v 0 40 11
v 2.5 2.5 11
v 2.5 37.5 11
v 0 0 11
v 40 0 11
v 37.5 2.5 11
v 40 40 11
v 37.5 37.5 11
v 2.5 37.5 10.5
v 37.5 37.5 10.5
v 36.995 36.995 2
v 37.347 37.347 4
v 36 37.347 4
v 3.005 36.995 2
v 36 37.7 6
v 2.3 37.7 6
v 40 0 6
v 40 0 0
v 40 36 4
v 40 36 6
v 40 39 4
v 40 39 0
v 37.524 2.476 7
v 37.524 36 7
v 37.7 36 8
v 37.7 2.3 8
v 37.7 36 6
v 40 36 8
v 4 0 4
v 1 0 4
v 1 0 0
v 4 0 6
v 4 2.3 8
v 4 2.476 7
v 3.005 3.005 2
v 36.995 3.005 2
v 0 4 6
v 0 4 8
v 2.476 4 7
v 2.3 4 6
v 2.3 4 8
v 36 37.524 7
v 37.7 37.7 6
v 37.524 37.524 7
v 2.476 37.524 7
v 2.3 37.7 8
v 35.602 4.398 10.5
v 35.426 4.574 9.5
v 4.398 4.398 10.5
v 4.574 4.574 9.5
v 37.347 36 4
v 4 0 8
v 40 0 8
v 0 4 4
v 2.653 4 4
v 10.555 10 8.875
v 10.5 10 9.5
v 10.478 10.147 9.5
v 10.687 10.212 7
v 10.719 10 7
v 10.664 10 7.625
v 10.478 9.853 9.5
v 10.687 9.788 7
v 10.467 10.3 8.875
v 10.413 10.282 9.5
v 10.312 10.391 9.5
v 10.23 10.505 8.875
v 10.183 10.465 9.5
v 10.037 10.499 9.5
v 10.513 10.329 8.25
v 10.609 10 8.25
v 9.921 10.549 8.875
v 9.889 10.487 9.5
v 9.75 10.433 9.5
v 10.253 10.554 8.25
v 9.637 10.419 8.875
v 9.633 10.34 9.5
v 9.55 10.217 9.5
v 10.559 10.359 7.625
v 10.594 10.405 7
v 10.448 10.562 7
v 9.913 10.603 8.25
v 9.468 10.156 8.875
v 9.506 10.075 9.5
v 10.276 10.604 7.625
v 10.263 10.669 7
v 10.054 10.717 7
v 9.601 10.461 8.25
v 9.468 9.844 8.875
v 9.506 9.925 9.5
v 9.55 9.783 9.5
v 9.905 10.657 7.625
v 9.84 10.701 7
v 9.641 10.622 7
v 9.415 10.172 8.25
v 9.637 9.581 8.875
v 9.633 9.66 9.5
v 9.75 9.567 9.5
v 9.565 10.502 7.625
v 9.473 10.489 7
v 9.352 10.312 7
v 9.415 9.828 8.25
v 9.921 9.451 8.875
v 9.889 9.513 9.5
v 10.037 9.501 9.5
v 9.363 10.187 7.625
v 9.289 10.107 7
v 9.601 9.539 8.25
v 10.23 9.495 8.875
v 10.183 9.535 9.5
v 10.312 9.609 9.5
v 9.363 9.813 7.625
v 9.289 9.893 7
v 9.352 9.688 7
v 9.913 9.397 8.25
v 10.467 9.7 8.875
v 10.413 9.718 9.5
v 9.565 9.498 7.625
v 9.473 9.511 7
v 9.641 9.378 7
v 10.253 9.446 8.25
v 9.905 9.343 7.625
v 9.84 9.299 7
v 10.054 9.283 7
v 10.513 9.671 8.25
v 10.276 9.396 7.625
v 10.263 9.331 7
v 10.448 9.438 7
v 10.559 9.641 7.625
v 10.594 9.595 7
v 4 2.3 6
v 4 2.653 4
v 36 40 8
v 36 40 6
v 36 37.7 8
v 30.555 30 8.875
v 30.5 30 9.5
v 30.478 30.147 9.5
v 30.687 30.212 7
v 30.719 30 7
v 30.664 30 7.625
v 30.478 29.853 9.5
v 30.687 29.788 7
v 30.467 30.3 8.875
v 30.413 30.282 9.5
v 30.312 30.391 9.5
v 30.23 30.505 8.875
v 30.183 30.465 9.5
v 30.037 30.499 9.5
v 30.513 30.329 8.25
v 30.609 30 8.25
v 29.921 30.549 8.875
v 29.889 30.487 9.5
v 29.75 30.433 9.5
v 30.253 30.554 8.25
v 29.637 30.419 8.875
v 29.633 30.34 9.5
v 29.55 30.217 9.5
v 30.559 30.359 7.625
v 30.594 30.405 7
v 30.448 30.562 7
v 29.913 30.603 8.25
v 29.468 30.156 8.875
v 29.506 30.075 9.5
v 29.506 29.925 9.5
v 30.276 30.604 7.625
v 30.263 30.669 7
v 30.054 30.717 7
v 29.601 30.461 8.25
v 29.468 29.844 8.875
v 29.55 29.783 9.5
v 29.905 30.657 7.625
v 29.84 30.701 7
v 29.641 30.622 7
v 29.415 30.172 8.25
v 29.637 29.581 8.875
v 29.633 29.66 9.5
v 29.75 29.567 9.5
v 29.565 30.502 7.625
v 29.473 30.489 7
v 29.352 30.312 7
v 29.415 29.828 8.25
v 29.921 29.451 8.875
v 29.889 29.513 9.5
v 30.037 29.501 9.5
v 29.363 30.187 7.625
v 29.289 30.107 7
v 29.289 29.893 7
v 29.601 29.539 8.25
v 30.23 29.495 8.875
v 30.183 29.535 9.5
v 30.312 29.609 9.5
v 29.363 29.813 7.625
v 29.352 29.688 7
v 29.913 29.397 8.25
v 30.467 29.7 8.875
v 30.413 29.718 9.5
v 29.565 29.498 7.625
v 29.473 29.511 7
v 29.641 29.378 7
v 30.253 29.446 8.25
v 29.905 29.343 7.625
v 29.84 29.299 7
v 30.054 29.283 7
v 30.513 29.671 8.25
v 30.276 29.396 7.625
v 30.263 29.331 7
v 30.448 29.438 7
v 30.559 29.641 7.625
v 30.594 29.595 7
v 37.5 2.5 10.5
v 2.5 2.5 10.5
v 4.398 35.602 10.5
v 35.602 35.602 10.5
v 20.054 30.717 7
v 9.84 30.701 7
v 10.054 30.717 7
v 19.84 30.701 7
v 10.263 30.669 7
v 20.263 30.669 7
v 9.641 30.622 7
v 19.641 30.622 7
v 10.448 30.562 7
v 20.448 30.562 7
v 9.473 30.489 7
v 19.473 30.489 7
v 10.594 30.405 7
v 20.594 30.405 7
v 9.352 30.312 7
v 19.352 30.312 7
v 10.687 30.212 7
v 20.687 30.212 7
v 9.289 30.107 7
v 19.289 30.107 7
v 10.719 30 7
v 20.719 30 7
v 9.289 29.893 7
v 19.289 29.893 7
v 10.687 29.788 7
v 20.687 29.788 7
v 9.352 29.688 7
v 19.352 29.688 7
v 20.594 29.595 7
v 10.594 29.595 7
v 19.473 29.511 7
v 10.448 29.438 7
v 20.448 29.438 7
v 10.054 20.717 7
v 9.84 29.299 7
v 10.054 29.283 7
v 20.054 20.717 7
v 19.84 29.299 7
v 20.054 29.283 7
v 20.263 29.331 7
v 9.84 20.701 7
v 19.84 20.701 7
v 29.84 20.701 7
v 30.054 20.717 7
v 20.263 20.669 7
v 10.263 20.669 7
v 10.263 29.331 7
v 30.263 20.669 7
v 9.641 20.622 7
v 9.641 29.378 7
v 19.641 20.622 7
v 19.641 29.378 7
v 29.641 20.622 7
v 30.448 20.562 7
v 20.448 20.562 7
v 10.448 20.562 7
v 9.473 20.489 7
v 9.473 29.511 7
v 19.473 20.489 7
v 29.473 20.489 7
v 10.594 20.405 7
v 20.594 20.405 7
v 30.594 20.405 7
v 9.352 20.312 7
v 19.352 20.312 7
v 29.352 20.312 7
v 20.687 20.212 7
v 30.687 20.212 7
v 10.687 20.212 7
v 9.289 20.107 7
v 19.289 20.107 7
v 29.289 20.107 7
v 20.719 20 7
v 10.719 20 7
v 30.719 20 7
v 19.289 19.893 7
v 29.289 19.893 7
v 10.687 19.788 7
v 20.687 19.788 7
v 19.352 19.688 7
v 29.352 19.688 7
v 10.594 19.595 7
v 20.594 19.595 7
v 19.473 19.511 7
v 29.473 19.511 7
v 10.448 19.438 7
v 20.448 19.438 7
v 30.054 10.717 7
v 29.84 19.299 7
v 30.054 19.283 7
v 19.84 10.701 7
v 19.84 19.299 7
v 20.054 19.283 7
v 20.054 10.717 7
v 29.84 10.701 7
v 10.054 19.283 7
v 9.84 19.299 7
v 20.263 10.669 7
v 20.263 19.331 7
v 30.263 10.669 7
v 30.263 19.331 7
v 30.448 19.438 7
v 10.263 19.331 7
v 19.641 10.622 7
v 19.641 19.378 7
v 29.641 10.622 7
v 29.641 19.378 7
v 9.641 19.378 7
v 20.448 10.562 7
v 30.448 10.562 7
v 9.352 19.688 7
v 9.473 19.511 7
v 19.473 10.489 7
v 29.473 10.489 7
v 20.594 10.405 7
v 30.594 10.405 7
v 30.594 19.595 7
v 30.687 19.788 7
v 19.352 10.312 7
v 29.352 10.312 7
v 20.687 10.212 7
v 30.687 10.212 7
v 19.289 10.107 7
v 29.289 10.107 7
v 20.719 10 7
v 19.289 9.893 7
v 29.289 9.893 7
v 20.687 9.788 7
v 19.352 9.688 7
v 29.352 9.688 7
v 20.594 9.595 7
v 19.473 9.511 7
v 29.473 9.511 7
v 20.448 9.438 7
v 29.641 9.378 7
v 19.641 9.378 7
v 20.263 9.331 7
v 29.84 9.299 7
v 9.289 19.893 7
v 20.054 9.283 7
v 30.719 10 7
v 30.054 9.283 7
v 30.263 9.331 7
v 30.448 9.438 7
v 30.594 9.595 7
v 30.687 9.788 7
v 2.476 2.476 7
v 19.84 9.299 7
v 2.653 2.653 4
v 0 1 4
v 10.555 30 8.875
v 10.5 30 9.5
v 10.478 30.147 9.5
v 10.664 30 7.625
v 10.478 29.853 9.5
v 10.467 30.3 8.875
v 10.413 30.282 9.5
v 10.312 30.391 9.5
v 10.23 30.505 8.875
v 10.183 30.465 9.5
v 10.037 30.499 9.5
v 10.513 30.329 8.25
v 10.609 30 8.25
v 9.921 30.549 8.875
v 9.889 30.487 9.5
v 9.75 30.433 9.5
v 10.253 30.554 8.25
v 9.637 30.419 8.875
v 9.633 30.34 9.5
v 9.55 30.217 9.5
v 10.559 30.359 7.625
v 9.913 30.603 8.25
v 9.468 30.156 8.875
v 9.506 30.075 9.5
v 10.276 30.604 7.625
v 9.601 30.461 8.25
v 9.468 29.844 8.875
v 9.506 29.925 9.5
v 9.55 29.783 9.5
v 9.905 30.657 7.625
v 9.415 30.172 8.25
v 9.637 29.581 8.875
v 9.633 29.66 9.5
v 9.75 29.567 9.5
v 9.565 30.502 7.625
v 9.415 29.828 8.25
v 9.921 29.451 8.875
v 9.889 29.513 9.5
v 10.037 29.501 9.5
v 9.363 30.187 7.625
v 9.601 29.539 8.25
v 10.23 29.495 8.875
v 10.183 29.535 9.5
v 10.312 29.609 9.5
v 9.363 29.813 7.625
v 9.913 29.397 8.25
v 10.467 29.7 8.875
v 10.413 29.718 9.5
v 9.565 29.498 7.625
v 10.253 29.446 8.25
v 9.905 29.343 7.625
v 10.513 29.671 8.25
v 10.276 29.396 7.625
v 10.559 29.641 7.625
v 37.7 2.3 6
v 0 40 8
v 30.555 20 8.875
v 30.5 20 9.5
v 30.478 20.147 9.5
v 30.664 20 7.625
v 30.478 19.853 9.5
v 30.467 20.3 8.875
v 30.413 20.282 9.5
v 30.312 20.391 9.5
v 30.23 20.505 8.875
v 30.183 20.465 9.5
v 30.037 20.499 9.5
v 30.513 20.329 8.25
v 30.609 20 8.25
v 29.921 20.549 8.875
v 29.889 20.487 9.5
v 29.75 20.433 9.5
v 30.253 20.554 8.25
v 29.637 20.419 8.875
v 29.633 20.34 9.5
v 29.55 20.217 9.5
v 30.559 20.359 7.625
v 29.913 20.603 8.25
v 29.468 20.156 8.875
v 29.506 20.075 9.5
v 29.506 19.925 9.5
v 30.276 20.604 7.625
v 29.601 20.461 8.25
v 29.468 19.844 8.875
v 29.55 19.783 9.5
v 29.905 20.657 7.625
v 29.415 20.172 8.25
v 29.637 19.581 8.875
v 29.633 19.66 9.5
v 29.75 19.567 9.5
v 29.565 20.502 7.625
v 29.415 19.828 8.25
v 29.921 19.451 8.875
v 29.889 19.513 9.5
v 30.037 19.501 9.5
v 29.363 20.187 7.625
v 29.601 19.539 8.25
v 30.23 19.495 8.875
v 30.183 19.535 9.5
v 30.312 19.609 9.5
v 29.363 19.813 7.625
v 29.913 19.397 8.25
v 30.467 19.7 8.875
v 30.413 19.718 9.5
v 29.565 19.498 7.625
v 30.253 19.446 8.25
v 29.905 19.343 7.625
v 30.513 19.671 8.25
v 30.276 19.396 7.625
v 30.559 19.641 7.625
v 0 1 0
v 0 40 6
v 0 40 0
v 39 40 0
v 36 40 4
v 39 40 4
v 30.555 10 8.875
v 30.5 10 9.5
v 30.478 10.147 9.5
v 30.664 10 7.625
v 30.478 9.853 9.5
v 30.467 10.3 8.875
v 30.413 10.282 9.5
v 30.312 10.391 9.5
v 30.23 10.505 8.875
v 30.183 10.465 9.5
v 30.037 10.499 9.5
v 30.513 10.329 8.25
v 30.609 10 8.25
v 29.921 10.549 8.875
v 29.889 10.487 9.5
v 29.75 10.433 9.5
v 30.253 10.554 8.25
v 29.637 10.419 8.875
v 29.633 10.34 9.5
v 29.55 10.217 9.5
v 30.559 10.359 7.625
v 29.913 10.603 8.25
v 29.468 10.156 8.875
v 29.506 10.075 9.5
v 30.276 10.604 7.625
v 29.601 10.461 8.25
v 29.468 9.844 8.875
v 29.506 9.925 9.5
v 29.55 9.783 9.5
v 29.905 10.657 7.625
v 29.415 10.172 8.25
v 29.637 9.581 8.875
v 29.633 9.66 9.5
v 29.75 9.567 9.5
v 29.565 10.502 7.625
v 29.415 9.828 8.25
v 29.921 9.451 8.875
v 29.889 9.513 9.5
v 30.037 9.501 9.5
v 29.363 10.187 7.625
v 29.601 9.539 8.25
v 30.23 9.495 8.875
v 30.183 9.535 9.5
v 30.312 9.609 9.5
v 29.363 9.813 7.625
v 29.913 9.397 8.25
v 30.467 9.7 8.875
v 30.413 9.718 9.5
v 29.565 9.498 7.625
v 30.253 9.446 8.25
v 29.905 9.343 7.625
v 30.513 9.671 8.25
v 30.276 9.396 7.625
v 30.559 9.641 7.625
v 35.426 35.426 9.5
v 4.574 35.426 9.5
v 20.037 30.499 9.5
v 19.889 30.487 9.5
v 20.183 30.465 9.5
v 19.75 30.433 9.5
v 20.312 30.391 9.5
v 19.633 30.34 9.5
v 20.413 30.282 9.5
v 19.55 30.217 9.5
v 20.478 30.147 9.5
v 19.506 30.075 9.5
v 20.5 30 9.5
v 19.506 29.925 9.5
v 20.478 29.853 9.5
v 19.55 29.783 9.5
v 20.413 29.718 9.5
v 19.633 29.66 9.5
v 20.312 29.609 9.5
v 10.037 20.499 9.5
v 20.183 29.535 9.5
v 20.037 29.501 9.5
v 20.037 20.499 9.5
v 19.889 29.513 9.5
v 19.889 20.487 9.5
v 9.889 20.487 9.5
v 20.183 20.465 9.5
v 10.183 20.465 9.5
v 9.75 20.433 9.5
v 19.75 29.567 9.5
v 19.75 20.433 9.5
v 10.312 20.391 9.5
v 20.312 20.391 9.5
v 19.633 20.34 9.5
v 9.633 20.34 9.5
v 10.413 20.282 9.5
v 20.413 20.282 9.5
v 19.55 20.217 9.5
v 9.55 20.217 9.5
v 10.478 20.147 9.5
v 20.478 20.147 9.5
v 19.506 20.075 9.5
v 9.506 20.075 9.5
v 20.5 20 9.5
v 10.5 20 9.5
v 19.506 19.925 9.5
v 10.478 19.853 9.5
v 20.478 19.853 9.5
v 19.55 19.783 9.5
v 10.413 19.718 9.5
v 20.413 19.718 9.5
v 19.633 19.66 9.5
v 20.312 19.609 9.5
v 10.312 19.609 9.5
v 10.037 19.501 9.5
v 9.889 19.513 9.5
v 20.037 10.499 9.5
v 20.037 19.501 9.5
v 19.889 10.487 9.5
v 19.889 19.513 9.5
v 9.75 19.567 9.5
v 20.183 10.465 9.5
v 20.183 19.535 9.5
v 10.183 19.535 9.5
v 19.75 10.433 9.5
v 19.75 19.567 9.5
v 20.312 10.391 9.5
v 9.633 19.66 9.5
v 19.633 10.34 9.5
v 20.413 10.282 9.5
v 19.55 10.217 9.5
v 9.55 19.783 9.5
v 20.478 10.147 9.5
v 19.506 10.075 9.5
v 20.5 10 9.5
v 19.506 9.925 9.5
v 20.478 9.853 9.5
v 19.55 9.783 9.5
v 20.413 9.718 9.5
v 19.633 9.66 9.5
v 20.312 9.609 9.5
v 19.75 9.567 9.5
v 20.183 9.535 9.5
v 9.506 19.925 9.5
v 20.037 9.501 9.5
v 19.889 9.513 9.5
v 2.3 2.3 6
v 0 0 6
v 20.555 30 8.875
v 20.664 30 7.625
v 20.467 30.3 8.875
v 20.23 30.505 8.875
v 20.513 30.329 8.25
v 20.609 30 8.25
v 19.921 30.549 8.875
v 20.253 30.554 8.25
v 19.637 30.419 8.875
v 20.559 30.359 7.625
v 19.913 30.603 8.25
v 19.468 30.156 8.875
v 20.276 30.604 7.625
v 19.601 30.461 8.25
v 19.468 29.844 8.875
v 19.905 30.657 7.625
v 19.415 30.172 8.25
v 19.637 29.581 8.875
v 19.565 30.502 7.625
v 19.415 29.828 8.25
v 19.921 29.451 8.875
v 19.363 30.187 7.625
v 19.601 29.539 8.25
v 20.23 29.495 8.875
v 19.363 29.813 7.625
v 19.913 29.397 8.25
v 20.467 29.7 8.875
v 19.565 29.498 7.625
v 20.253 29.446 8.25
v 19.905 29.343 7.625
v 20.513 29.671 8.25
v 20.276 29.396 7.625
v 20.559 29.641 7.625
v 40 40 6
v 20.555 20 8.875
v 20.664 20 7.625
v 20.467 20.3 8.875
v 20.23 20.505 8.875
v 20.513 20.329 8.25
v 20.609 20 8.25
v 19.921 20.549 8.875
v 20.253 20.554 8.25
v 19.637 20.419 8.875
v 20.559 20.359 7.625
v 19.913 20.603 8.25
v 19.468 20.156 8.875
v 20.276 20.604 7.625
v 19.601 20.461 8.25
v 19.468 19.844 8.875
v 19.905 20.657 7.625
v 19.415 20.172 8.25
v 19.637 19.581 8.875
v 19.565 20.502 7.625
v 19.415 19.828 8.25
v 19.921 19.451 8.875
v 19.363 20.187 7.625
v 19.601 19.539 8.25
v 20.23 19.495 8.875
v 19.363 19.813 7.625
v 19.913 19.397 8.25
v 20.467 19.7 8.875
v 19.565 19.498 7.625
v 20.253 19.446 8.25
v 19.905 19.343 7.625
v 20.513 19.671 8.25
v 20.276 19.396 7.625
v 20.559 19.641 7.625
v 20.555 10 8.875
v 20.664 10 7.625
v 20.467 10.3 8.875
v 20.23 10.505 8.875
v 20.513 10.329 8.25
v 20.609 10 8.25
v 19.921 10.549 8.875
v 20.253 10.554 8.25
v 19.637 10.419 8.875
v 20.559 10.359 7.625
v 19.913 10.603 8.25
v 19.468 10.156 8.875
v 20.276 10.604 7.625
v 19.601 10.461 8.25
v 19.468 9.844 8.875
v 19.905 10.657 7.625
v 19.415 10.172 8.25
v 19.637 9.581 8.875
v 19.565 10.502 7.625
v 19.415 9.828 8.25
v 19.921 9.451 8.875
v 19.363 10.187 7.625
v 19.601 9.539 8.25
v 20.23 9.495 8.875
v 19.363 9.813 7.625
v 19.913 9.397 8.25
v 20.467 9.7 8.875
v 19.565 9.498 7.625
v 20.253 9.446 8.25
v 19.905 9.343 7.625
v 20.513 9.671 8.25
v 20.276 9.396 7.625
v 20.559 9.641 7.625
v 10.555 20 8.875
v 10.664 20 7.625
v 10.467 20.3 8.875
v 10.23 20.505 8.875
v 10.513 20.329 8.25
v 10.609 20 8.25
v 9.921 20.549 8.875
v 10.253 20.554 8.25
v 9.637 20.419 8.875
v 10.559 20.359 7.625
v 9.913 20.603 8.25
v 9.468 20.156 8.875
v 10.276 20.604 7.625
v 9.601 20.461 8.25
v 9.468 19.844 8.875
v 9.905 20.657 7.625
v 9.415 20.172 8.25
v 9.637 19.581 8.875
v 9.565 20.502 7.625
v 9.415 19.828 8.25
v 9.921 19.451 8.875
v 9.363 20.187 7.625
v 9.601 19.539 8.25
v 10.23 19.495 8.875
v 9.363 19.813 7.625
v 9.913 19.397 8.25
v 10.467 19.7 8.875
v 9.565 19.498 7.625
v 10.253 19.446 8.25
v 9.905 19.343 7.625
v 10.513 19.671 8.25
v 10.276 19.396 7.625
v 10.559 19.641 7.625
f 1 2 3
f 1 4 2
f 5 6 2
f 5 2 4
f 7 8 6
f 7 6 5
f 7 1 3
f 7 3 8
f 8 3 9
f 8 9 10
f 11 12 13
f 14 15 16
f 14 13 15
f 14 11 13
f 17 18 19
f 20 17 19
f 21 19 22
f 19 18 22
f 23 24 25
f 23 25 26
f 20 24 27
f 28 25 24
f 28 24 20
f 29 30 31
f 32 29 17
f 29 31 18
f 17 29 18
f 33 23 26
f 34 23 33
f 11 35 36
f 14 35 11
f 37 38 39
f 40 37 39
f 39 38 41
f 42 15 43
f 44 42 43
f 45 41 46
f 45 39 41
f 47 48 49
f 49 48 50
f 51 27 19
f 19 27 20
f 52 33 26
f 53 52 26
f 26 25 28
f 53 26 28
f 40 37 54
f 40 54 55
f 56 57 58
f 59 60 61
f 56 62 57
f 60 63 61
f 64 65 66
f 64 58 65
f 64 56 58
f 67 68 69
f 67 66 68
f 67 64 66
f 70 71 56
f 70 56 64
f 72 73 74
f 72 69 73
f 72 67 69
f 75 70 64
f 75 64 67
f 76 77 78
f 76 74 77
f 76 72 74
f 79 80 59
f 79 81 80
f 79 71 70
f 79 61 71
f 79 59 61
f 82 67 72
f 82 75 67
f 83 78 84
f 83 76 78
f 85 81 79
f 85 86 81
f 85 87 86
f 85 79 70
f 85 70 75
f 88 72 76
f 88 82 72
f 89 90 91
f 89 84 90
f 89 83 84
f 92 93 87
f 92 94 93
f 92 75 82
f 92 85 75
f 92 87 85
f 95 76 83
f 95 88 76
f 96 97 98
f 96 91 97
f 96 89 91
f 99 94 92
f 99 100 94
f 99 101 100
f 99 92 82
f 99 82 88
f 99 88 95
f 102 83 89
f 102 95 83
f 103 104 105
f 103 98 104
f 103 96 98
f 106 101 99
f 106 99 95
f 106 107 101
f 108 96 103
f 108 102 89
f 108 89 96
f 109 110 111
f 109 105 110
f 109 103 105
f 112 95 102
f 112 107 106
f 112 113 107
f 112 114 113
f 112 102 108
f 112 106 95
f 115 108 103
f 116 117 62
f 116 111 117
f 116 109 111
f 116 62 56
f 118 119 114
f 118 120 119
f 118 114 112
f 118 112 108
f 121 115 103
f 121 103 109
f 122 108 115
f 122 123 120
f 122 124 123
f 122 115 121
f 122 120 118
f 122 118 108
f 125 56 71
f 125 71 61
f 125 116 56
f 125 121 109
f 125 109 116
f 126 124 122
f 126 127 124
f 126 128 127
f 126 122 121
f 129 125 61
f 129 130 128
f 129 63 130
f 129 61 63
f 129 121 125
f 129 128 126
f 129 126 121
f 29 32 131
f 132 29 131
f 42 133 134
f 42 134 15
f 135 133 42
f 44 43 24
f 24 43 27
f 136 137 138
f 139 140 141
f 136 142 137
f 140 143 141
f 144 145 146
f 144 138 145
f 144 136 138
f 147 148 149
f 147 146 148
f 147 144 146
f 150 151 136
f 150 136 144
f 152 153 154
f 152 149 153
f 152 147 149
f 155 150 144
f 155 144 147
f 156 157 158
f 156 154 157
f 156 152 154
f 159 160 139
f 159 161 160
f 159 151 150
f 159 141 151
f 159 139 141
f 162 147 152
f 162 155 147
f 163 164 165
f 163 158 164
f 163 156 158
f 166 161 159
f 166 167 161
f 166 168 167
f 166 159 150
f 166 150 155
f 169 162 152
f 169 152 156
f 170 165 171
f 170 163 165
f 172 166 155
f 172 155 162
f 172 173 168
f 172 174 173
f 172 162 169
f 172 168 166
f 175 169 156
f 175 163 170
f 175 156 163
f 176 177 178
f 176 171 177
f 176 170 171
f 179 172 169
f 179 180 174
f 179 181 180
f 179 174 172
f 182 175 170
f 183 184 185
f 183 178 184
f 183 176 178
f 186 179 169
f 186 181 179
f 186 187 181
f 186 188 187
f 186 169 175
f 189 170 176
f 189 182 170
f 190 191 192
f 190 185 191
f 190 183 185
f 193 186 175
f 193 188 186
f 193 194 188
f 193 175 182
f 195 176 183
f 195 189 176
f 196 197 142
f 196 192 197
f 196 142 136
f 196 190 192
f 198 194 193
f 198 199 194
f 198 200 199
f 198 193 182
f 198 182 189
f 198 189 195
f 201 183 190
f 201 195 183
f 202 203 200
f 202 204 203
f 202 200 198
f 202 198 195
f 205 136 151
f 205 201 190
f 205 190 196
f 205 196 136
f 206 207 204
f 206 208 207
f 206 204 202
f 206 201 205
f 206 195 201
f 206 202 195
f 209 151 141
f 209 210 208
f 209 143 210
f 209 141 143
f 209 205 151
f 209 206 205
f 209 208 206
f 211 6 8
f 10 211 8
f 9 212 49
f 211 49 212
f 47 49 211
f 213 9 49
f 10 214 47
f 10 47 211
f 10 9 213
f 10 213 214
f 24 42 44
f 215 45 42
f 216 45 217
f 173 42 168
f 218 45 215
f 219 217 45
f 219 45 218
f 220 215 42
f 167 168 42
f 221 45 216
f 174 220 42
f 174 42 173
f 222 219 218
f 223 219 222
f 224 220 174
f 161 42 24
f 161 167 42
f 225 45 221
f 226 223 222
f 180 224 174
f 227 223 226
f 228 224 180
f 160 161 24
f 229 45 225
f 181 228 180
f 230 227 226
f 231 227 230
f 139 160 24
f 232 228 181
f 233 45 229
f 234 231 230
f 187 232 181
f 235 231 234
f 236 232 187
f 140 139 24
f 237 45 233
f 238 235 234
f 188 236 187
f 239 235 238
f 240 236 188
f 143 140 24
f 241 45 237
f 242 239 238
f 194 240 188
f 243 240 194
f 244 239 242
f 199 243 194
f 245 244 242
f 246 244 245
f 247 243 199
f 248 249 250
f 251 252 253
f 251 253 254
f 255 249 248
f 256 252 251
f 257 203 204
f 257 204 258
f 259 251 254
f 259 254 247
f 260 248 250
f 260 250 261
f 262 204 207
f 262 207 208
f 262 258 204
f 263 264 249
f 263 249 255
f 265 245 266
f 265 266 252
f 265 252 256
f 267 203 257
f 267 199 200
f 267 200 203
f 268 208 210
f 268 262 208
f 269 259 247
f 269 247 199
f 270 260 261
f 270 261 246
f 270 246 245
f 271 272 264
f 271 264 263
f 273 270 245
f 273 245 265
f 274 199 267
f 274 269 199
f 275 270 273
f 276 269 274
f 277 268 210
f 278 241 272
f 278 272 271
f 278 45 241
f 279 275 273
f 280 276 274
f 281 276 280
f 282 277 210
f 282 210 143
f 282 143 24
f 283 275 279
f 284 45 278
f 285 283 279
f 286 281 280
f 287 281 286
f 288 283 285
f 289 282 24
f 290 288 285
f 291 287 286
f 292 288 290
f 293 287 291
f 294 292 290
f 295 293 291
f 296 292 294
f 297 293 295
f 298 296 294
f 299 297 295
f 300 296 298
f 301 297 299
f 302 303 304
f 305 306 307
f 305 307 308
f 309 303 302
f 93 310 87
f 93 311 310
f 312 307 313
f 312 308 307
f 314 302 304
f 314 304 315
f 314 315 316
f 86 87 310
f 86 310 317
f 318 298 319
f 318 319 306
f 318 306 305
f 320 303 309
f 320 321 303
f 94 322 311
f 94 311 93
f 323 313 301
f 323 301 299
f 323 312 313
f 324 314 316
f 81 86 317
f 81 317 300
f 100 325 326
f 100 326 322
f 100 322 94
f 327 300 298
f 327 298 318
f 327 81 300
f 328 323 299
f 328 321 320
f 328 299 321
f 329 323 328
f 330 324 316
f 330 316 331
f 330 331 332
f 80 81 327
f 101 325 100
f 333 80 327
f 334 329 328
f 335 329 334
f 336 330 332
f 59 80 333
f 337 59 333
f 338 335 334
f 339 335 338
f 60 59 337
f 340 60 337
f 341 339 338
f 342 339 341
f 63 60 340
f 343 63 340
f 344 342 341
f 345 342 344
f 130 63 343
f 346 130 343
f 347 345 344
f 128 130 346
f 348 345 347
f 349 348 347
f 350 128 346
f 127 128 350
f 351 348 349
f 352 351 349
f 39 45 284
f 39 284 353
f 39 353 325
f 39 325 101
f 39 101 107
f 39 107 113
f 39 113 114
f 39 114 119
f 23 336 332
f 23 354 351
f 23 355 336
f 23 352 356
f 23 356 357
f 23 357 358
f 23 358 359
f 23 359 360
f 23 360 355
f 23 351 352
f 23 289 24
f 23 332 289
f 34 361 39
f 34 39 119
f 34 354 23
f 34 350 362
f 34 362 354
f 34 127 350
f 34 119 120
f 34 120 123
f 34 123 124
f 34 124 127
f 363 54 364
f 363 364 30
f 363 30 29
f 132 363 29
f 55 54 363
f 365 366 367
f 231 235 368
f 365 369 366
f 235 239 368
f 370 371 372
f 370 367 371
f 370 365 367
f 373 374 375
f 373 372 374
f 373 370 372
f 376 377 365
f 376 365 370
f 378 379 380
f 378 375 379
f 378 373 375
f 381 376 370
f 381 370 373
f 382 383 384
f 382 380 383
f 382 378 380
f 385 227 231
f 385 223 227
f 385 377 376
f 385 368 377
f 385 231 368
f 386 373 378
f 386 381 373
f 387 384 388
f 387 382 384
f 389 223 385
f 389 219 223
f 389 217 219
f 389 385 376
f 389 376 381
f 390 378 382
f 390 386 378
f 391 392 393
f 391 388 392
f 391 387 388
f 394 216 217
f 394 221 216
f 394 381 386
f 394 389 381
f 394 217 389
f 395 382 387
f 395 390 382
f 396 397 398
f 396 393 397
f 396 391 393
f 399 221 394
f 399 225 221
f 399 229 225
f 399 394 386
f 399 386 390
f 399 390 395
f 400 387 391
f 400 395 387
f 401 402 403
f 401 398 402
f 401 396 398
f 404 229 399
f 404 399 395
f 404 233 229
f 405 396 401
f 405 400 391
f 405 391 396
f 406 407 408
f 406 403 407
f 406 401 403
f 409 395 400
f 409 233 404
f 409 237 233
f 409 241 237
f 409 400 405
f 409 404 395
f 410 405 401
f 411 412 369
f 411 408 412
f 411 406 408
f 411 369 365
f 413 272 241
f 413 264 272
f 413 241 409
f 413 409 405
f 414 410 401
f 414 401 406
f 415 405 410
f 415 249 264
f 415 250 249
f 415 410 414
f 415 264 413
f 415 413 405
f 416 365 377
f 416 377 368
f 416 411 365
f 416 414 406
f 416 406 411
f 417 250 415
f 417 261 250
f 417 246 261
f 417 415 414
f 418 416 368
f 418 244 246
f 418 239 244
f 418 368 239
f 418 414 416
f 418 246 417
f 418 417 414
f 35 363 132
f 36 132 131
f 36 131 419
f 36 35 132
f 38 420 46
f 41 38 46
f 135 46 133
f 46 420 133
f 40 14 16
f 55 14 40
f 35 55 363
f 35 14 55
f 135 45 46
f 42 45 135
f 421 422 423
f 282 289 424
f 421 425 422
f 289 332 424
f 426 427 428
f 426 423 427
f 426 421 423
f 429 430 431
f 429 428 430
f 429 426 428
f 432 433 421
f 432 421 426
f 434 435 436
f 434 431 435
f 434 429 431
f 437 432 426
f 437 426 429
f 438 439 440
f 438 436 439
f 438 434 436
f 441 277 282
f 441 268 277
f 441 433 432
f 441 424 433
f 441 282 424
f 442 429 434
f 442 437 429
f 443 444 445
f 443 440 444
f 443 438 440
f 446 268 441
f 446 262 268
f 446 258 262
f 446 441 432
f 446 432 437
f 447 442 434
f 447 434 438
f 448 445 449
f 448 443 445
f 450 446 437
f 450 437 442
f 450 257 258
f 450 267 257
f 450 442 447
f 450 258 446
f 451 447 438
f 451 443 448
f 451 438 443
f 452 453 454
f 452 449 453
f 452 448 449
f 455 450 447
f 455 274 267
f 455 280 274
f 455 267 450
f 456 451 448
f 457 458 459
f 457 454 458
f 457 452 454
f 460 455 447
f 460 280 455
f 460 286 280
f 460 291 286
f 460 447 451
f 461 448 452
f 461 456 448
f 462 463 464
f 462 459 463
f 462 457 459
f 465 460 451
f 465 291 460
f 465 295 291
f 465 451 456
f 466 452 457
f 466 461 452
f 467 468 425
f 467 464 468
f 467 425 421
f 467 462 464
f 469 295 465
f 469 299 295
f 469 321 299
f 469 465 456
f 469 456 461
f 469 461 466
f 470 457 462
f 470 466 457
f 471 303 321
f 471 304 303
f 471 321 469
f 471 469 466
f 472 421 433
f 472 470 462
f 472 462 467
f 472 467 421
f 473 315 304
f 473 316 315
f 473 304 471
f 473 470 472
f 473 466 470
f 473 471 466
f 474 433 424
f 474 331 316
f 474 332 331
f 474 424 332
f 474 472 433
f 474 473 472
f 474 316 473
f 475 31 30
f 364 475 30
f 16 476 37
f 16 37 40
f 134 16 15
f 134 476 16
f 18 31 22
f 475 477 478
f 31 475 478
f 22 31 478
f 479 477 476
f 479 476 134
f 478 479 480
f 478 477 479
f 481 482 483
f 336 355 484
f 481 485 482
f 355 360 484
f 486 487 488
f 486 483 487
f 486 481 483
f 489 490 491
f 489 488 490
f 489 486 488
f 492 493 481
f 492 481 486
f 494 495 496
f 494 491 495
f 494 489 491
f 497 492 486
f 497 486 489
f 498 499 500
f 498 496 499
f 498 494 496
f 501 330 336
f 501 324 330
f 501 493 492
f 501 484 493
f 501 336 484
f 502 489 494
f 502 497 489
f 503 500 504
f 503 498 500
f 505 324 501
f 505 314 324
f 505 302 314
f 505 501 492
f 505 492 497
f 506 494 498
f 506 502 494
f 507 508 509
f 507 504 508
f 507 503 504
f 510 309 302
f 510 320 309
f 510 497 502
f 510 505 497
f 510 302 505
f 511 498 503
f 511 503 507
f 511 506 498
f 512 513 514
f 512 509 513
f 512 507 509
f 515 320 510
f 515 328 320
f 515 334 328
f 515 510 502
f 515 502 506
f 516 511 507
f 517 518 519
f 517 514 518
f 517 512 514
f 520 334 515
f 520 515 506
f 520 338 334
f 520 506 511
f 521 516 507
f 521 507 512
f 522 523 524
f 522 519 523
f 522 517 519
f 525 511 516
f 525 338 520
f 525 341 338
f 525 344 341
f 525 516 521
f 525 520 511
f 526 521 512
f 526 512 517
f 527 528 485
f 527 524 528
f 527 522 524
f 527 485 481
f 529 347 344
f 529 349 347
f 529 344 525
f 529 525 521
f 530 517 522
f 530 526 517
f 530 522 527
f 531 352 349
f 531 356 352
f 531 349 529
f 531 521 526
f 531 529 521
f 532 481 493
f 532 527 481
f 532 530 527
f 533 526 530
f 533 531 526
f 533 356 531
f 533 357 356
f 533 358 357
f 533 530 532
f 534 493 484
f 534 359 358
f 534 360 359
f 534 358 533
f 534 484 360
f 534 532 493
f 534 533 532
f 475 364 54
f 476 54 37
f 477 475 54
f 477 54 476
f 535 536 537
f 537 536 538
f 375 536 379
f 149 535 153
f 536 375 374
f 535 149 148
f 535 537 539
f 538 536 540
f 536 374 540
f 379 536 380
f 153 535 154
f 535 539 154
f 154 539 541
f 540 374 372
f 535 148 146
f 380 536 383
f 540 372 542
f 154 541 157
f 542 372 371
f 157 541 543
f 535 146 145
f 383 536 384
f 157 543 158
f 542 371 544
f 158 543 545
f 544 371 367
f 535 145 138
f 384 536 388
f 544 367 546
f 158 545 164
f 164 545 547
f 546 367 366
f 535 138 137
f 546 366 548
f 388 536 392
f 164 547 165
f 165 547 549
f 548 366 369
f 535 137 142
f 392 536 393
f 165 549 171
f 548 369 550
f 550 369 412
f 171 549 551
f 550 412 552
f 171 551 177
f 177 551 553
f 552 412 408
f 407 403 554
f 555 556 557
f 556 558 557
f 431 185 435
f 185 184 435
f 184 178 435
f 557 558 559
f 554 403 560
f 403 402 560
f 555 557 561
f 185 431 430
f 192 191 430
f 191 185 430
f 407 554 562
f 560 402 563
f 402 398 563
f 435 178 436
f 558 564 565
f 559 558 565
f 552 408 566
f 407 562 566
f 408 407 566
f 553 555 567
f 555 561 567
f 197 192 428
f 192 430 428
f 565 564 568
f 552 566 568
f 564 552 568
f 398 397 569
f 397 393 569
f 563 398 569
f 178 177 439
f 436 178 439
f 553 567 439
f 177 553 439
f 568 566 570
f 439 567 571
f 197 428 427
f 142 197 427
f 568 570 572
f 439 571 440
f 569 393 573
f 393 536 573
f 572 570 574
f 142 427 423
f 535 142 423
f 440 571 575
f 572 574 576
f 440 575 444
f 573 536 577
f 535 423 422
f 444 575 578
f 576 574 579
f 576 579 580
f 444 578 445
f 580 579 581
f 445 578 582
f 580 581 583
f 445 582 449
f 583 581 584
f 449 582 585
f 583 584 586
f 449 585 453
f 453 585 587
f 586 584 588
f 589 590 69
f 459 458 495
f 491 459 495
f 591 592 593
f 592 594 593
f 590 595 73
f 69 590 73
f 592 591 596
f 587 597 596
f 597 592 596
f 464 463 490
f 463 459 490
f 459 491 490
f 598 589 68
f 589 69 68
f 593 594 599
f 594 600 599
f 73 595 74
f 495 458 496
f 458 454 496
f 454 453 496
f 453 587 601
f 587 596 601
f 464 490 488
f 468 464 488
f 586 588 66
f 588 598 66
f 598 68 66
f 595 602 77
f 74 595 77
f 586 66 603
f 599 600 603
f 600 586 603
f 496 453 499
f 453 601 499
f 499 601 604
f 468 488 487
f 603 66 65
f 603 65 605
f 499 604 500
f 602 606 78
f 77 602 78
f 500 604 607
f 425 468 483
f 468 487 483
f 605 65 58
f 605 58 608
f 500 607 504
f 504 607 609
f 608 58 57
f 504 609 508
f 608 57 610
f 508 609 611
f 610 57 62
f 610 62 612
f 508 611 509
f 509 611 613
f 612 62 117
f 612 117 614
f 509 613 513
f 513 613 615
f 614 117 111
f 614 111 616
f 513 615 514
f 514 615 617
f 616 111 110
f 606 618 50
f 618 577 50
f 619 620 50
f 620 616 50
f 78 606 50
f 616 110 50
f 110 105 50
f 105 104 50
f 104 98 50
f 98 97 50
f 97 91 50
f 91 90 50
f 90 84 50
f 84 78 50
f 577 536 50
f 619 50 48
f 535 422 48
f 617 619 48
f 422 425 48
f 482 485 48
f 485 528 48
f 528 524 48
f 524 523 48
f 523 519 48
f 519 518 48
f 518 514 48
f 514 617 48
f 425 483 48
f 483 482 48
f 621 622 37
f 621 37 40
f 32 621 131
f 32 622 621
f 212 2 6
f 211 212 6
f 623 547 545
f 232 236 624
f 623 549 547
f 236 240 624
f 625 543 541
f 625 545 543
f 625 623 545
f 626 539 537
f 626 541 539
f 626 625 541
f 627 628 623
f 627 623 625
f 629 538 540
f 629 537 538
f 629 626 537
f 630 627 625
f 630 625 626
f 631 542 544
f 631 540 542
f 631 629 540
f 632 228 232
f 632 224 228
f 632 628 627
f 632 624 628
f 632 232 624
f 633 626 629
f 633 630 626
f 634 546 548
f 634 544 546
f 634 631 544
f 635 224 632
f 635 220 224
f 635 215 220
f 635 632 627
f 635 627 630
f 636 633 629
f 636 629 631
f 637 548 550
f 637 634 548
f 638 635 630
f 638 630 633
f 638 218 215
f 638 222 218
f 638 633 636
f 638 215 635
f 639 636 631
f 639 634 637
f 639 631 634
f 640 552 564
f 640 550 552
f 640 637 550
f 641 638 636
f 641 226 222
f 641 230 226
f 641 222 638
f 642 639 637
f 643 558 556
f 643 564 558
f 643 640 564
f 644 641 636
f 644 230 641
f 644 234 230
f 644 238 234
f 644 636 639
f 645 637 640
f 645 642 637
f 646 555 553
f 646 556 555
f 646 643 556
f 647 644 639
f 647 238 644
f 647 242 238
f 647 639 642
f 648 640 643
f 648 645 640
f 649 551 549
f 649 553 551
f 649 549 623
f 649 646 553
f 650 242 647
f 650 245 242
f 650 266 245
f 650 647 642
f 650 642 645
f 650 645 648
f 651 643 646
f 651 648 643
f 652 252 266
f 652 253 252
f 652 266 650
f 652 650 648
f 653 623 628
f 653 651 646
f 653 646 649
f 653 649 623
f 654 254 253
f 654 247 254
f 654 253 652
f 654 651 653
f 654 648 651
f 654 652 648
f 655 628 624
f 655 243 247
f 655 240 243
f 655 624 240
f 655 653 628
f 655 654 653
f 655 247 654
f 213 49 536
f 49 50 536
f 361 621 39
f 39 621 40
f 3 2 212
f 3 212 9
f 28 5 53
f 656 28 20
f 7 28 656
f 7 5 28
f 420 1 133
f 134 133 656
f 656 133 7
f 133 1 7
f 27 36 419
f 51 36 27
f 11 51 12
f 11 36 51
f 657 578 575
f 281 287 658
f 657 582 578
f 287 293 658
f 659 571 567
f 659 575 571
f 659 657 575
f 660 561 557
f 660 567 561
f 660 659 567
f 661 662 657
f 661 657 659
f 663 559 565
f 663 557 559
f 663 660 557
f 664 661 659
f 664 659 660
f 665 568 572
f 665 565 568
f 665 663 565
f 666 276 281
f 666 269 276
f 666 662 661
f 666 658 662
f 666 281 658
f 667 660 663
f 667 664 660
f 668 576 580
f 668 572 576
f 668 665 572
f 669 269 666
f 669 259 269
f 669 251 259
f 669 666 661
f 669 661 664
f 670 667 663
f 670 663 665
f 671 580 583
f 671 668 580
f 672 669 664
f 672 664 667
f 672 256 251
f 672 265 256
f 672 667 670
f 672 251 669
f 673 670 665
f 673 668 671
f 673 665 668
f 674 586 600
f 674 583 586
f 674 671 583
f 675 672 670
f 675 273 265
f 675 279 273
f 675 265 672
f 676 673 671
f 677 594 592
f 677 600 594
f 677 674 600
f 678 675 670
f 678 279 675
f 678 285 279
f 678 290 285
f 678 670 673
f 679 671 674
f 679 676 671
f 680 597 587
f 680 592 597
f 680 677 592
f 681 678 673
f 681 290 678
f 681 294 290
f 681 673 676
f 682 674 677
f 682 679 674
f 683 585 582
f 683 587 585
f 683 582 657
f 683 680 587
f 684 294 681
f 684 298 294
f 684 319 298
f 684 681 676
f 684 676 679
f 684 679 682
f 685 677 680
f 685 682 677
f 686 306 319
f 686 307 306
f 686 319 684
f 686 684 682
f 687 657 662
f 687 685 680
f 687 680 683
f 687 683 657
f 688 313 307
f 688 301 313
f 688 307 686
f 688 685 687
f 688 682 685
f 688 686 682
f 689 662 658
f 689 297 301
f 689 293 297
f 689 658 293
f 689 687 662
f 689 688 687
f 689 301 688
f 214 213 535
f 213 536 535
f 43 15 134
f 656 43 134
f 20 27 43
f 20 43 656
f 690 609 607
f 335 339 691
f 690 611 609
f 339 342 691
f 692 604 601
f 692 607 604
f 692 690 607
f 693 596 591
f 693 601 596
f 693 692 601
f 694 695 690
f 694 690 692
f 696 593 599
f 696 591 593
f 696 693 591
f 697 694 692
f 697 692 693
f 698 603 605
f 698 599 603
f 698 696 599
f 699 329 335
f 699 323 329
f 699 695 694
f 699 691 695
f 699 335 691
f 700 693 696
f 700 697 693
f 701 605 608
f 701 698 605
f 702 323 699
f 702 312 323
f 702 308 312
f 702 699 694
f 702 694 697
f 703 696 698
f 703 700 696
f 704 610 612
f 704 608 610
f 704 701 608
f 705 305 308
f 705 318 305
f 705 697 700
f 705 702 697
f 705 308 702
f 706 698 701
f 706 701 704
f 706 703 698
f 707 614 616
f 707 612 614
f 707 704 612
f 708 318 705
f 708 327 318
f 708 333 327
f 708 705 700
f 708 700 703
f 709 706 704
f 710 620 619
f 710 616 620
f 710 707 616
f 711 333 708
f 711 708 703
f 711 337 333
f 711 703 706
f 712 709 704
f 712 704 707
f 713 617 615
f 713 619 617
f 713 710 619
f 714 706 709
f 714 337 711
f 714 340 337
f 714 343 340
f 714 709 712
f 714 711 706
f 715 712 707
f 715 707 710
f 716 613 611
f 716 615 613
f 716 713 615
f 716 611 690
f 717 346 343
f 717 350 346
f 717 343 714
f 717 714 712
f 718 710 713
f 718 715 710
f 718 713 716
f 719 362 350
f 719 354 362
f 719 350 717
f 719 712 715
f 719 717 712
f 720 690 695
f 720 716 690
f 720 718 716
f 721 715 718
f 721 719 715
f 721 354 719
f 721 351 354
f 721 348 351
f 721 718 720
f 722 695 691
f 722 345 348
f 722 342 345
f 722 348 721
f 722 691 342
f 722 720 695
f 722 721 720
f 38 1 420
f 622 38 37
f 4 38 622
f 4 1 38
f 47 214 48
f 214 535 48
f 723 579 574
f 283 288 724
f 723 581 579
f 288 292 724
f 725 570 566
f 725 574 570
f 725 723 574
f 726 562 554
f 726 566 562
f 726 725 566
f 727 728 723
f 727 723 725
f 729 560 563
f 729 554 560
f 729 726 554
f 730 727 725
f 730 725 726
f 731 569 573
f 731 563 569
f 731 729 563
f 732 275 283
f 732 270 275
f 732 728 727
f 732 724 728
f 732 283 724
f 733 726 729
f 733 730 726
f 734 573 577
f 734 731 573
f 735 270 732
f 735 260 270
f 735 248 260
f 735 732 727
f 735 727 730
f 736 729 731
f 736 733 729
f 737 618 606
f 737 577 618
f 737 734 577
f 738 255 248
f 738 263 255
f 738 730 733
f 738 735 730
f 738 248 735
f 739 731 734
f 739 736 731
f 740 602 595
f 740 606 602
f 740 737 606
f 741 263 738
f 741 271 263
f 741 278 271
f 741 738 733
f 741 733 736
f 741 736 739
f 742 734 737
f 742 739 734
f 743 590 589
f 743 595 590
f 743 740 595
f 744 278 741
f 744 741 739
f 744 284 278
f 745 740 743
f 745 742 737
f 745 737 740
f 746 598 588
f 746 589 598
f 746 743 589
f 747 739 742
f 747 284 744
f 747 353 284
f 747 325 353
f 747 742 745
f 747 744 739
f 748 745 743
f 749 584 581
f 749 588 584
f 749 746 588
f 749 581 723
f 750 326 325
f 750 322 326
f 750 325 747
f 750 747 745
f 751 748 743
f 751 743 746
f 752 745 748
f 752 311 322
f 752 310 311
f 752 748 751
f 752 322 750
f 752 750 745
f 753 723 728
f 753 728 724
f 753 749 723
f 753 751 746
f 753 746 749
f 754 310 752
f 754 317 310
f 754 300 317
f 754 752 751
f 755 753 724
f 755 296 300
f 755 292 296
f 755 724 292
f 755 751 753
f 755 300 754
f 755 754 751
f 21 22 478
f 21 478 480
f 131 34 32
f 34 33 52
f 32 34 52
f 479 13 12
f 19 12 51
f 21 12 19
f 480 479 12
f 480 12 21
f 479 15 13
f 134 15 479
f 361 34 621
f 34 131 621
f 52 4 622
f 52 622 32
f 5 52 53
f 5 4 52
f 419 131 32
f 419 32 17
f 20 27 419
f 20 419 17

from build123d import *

# Parameters (mm, degrees)
F0_W      = 40
F0_H      = 40
F1_DEPTH  = 6
F4_W      = 40
F4_H      = 40
F5_DEPTH  = 3
F2_W      = 35.4
F2_H      = 35.4
F6_DEPTH  = 4
F6_TAPER  = 10
F8_W      = 35.4
F8_H      = 35.4
F9_DEPTH  = 1
F9_TAPER  = 10
F10_T     = -2.5
F11_R     = 0.5
F12_DEPTH = 2.5
F12_TAPER = -5
F13_SIZE  = 1
F14_W     = 4
F14_H     = 4
F15_DEPTH = 2
F17_W     = 4
F17_H     = 4
F18_DEPTH = 2
F19_W     = 35.0473460386
F19_H     = 35.0473460386
F20_DEPTH = 25
F20_TAPER = -10


with BuildPart() as f1:
    # F0 (on Top) → F1 (new body)
    with BuildSketch(Plane.XY):
        with Locations((20, 20)):
            Rectangle(F0_W, F0_H)
    extrude(amount=F1_DEPTH)

    # F2 (on face) → F6 (cut)
    with BuildSketch(Plane.XY.offset(6)):
        with Locations((20, 20)):
            Rectangle(F2_W, F2_H)
    extrude(amount=-F6_DEPTH, taper=F6_TAPER, mode=Mode.SUBTRACT)

    # F13
    f13_edges = [f1.edges().sort_by_distance(p)[0] for p in [
        (0, 0, 3),
        (40, 40, 3),
    ]]
    chamfer(f13_edges, length=F13_SIZE)

    # F14 (on face) → F15 (cut)
    with BuildSketch(Plane.XY.offset(6)):
        with Locations((2, 2)):
            Rectangle(F14_W, F14_H)
        with Locations((38, 38)):
            Rectangle(F14_W, F14_H)
    extrude(amount=-F15_DEPTH, mode=Mode.SUBTRACT)


with BuildPart() as f5:
    # F4 (on offset) → F5 (new body)
    with BuildSketch(Plane.XY.offset(11)):
        with Locations((20, 20)):
            Rectangle(F4_W, F4_H)
    extrude(amount=-F5_DEPTH)

    # F8 (on face) → F9 (join)
    with BuildSketch(Plane(origin=(0, 0, 8), x_dir=(1, 0, 0), z_dir=(0, 0, -1))):
        with Locations((20, -20)):
            Rectangle(F8_W, F8_H)
    extrude(amount=F9_DEPTH, taper=F9_TAPER)

    # F10
    f10_openings = [f5.faces().sort_by_distance(p)[0] for p in [
        (20, 20, 11),
    ]]
    offset(amount=F10_T, openings=f10_openings, kind=Kind.INTERSECTION)

    # F11 (on face) → F12 (cut, through all)
    with BuildSketch(Plane.XY.offset(9.5)):
        with Locations((10, 30)):
            Circle(F11_R)
        with Locations((20, 30)):
            Circle(F11_R)
        with Locations((30, 30)):
            Circle(F11_R)
        with Locations((10, 20)):
            Circle(F11_R)
        with Locations((10, 10)):
            Circle(F11_R)
        with Locations((20, 20)):
            Circle(F11_R)
        with Locations((20, 10)):
            Circle(F11_R)
        with Locations((30, 20)):
            Circle(F11_R)
        with Locations((30, 10)):
            Circle(F11_R)
    extrude(amount=-F12_DEPTH, taper=F12_TAPER, mode=Mode.SUBTRACT)

    # F17 (on face) → F18 (join)
    with BuildSketch(Plane(origin=(0, 0, 8), x_dir=(1, 0, 0), z_dir=(0, 0, -1))):
        with Locations((2, -2)):
            Rectangle(F17_W, F17_H)
        with Locations((38, -38)):
            Rectangle(F17_W, F17_H)
    extrude(amount=F18_DEPTH)

    # F19 (on face) → F20 (cut)
    with BuildSketch(Plane(origin=(0, 0, 7), x_dir=(1, 0, 0), z_dir=(0, 0, -1))):
        with Locations((20, -20)):
            Rectangle(F19_W, F19_H)
    extrude(amount=F20_DEPTH, taper=F20_TAPER, mode=Mode.SUBTRACT)


solid = Compound([f1.part, f5.part])
